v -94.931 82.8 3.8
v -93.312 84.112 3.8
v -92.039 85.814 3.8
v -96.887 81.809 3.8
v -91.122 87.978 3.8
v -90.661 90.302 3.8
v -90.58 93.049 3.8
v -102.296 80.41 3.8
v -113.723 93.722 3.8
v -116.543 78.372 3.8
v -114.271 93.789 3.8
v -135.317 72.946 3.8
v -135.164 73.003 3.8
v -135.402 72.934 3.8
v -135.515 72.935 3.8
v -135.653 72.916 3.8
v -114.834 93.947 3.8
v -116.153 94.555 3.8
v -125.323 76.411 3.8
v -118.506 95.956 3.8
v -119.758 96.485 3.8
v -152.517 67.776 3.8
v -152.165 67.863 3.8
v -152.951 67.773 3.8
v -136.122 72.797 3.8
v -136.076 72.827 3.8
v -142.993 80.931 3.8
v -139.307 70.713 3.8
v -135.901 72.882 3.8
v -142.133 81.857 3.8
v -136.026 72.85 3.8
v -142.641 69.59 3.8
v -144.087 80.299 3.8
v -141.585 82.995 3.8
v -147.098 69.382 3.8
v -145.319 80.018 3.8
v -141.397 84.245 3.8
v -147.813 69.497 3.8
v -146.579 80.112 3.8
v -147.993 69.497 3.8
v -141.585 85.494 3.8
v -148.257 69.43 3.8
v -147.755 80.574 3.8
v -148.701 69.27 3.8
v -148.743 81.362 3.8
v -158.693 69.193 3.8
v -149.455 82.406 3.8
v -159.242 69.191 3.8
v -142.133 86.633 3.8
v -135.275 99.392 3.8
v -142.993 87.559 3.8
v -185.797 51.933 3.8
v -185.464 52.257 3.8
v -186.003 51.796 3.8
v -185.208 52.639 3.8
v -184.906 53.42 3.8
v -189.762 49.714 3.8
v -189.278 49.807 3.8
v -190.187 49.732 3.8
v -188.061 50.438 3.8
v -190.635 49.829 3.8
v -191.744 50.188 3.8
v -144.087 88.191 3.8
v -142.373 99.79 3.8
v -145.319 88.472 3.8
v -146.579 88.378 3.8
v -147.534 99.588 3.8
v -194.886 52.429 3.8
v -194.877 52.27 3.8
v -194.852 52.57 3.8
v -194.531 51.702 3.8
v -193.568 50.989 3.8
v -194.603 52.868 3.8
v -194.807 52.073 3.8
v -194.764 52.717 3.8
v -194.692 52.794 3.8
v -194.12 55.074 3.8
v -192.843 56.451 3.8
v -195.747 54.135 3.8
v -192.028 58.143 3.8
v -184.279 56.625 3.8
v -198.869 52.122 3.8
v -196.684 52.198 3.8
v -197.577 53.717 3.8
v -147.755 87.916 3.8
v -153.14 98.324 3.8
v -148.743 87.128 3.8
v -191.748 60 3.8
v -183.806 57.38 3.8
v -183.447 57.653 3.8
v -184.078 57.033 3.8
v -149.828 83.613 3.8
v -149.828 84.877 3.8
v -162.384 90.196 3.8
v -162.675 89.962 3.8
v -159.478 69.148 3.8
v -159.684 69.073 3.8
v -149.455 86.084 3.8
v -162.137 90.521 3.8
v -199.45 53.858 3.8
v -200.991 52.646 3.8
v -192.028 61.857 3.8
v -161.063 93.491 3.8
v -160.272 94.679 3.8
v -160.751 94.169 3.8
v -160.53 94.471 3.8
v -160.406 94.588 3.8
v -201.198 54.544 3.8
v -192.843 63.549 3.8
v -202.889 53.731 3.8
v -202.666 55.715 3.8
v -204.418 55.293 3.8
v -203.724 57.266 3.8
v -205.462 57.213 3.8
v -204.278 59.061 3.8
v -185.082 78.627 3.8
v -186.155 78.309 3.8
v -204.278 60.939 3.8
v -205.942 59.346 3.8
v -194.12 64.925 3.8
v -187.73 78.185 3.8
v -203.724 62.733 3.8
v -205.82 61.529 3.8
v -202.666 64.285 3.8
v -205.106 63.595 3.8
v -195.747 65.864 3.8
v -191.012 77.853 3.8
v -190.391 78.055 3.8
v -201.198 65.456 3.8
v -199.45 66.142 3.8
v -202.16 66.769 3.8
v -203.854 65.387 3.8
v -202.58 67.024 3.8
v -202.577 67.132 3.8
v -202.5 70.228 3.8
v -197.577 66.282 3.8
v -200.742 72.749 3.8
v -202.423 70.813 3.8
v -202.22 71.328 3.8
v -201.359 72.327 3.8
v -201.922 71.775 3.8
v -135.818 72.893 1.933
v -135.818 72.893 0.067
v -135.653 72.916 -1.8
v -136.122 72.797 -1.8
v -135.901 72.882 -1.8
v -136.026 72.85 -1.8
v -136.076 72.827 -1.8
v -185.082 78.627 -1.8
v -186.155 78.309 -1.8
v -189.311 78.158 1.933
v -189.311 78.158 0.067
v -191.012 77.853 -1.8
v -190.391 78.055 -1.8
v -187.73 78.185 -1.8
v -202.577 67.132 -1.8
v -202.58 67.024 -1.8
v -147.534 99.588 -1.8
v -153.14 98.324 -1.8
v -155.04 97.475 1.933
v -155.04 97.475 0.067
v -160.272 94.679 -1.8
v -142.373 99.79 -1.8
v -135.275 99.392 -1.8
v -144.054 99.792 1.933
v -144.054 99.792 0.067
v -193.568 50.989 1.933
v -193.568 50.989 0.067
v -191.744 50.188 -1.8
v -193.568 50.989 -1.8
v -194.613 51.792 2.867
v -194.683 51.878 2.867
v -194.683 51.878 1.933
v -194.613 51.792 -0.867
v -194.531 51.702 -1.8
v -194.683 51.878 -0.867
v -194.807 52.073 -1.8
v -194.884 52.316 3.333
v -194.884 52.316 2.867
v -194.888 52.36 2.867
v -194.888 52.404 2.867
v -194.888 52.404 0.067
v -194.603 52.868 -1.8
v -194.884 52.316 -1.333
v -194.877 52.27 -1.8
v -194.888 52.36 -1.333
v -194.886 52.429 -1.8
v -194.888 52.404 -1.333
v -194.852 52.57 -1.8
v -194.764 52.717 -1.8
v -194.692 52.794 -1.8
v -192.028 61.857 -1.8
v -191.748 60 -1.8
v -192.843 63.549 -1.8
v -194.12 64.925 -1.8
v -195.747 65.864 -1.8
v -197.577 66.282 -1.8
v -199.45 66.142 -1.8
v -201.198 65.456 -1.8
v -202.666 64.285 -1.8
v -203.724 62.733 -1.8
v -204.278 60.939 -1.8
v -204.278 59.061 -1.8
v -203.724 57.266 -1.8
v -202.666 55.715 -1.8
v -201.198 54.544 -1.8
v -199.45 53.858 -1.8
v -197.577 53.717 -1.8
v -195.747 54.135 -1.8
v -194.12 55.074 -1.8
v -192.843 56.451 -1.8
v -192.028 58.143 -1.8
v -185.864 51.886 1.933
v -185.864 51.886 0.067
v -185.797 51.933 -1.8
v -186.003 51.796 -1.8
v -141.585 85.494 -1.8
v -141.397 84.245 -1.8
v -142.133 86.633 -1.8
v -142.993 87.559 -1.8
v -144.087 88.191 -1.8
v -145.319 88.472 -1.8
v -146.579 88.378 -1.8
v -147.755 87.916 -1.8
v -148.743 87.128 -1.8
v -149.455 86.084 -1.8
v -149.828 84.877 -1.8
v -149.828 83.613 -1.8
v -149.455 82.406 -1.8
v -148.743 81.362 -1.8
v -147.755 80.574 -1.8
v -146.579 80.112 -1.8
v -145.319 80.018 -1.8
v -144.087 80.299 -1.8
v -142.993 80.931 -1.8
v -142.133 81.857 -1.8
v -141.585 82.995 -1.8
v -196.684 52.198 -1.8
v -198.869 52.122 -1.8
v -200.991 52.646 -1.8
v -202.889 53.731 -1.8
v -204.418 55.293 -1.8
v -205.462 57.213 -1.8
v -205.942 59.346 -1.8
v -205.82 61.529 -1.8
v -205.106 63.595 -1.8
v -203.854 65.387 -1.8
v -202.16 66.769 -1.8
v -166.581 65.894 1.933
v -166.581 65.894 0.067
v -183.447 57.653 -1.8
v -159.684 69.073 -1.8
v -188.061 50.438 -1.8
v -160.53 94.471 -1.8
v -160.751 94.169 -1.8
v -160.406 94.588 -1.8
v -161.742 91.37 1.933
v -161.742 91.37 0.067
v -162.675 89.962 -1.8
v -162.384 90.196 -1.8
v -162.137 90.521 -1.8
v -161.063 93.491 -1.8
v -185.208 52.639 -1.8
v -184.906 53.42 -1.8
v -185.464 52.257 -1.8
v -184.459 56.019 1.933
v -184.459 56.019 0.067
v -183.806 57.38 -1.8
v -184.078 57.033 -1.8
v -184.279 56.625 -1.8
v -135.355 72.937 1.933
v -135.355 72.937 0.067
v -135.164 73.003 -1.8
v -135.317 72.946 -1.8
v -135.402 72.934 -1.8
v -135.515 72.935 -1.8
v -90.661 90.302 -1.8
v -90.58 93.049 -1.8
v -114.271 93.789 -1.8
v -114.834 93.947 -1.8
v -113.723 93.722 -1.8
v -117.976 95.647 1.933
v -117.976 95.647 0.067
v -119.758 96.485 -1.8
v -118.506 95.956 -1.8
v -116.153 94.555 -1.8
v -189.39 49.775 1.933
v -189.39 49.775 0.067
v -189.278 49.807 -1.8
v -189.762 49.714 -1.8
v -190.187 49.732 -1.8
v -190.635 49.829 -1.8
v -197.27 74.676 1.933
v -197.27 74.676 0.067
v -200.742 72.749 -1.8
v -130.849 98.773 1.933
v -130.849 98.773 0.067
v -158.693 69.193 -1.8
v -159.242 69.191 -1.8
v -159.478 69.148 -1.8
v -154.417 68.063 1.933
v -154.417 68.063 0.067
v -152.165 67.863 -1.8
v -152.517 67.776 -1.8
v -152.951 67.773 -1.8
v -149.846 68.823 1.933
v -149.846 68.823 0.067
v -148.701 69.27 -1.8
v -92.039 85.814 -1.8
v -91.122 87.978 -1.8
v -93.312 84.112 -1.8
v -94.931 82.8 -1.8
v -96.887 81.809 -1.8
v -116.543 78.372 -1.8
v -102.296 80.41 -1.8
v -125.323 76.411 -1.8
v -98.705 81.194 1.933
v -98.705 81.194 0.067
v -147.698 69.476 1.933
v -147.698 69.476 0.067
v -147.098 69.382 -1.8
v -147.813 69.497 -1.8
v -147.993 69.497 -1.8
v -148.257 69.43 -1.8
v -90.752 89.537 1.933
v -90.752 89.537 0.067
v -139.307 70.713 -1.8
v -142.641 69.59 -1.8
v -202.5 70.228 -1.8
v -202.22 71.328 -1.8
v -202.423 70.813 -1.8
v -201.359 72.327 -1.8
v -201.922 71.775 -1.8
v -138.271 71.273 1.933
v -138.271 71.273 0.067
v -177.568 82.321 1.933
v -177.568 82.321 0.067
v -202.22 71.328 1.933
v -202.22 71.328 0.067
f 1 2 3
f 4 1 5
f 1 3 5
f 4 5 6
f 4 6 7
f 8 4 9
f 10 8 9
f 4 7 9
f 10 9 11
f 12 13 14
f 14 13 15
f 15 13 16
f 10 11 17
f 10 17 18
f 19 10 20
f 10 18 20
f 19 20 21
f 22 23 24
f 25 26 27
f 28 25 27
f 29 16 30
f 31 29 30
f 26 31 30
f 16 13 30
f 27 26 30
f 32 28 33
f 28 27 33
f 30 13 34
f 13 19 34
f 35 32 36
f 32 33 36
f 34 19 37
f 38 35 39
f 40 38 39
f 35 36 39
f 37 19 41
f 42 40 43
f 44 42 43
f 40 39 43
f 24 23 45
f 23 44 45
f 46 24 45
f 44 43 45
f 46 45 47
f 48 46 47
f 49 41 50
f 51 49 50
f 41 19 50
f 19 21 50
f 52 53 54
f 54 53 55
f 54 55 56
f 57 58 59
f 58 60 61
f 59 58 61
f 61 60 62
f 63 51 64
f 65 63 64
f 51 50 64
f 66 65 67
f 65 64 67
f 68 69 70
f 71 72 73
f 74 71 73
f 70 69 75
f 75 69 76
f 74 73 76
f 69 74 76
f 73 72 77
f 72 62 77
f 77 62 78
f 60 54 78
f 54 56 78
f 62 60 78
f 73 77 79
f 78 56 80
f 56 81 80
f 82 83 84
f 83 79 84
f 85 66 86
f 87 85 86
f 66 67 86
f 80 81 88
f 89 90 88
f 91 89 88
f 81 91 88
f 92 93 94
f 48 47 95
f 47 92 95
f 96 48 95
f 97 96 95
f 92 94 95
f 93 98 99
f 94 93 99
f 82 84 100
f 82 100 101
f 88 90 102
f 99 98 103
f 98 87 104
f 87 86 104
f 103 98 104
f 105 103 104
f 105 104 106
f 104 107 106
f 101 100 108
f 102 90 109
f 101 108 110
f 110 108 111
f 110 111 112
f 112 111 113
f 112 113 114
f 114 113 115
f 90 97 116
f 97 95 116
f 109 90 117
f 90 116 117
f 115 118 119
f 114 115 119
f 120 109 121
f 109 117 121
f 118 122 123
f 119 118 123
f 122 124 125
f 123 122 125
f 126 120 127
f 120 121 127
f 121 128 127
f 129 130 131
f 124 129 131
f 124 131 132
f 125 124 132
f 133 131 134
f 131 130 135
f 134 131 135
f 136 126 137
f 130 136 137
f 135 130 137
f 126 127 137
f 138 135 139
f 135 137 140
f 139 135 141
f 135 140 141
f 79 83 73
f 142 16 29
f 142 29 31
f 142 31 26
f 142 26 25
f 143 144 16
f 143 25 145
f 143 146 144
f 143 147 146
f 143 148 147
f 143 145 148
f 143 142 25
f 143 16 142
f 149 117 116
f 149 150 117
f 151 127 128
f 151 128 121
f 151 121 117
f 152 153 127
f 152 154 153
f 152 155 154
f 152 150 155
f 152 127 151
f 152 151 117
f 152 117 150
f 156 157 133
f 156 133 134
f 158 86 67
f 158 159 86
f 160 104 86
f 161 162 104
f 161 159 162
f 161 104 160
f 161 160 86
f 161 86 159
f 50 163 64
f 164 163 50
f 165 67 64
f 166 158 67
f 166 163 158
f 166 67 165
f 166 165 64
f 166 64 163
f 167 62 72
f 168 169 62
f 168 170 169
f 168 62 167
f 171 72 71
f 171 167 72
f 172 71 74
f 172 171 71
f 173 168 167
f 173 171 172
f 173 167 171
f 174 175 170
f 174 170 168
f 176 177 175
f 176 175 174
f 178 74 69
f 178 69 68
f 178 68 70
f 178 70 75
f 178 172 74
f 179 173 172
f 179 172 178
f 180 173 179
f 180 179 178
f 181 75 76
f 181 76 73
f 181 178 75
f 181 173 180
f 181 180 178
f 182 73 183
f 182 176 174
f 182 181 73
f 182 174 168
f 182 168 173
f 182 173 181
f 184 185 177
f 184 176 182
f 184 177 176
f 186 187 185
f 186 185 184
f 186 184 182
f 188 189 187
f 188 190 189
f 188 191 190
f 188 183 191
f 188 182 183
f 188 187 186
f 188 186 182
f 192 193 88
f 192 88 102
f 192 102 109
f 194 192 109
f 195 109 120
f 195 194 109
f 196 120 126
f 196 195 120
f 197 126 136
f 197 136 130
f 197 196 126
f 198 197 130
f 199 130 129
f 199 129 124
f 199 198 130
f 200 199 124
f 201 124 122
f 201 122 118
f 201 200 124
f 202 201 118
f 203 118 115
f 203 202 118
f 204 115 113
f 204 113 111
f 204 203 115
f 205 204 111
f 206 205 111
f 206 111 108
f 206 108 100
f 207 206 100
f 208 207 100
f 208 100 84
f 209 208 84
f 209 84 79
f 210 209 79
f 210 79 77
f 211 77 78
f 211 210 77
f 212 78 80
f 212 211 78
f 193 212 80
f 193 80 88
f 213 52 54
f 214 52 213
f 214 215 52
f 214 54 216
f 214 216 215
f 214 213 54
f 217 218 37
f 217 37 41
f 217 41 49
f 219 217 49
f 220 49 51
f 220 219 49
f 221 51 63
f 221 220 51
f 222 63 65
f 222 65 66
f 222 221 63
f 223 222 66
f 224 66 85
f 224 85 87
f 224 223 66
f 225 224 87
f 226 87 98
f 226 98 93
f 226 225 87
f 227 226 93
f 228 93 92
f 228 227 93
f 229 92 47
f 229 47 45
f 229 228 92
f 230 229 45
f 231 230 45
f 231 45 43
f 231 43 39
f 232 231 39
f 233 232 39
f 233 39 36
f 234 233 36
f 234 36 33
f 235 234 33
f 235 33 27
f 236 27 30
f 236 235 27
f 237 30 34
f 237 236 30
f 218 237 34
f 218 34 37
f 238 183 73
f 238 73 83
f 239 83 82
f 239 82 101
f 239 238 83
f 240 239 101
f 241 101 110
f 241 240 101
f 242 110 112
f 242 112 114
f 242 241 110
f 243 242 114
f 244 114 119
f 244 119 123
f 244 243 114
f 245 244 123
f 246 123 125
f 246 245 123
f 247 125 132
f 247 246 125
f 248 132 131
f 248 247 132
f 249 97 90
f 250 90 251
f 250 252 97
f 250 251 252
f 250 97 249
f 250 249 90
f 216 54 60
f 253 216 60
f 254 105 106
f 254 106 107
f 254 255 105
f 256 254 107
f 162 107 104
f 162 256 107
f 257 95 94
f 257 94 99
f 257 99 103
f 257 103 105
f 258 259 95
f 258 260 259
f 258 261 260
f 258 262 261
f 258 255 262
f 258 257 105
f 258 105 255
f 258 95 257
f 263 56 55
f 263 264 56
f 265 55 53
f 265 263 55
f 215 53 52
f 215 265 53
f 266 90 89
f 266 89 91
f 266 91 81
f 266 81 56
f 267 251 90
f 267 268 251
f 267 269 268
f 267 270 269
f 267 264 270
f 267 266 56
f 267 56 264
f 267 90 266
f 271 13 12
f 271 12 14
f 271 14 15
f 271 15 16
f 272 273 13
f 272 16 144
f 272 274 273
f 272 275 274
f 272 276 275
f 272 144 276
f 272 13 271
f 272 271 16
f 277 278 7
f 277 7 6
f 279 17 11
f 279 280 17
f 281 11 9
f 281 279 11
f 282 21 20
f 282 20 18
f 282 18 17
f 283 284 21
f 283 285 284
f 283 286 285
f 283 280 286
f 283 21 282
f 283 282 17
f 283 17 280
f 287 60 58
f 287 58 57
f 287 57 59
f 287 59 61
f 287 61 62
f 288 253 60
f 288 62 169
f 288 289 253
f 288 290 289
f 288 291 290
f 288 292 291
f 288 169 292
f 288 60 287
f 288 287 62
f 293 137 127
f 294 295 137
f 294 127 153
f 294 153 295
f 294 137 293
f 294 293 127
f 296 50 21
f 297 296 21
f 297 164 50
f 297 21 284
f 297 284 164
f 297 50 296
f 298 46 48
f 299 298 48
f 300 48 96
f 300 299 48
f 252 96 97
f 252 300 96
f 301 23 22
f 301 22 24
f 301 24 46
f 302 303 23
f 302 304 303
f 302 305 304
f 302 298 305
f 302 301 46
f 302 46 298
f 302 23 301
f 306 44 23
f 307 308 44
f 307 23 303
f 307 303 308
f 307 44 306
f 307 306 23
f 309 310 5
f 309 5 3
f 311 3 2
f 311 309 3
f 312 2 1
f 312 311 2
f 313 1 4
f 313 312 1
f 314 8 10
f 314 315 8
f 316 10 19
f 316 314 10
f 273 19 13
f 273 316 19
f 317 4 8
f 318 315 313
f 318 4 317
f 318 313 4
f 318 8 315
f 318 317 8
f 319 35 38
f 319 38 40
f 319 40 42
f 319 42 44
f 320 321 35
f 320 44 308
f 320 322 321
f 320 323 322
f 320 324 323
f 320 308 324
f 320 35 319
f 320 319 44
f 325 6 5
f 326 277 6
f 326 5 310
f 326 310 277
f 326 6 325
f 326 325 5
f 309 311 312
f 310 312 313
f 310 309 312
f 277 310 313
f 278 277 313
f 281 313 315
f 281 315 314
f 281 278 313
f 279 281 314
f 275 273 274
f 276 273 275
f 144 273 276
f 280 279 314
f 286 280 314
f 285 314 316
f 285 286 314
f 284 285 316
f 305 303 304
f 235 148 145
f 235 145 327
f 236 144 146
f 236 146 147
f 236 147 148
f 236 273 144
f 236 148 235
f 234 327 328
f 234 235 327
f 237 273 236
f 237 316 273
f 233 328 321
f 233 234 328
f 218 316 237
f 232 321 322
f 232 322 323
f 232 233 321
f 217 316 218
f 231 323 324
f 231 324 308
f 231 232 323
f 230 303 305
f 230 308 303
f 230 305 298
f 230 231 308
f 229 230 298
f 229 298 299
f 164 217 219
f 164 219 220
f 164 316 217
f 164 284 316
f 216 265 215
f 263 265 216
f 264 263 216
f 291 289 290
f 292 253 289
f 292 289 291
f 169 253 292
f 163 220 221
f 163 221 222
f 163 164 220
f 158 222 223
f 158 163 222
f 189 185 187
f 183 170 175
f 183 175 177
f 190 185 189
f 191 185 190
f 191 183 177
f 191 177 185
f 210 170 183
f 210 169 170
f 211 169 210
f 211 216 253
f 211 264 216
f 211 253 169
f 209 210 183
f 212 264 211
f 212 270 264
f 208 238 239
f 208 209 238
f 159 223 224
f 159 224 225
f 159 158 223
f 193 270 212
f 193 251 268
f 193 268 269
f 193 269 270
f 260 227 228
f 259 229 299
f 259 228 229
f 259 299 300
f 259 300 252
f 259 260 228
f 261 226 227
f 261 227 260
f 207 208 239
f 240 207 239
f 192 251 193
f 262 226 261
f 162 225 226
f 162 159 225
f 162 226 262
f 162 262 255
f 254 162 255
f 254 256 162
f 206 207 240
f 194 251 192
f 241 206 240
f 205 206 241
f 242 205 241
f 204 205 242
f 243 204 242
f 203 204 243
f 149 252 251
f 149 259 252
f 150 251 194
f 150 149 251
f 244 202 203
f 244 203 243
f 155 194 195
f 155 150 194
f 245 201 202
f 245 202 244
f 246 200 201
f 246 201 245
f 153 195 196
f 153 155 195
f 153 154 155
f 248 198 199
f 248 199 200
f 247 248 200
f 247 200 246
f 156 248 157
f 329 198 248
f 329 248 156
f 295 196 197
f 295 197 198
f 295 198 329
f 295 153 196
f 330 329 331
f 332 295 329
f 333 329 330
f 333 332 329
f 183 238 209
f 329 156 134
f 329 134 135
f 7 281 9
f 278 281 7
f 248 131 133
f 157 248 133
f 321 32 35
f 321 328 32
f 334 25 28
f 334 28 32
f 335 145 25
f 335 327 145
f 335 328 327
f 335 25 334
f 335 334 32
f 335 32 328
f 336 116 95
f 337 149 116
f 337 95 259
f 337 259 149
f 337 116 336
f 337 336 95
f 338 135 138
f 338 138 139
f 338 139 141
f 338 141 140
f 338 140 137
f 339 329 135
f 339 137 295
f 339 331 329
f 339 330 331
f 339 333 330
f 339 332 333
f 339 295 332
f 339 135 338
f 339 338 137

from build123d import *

# Parameters (mm, degrees)
SKETCH1_R           = 1.513948887
SKETCH1_R_2         = 2.25
BOSS_EXTRUDE1_DEPTH = 2
SCALE1_SCALE        = 2.8


with BuildPart() as part:
    # Sketch1 → Boss-Extrude1 (new body)
    with BuildSketch(Plane.XY):
        with BuildLine():
            Line((-137.330840139, 84.740646997), (-129.065622639, 84.500215059))
            Line((-129.065622639, 84.500215059), (-129.094489584, 83.519353553))
            add(Edge.make_bspline(
                [(-129.094489584, 83.519353553), (-129.101127466, 83.291204798), (-129.199889222, 82.884598348), (-129.259340655, 82.689308143)],
                knots=[0.212765957, 0.212765957, 0.212765957, 0.212765957, 0.234042553, 0.234042553, 0.234042553, 0.234042553], degree=3))
            add(Edge.make_bspline(
                [(-129.259340655, 82.689308143), (-130.523557303, 78.537033893), (-136.295329969, 80.981325314), (-144.988370325, 77.341015795)],
                knots=[0.234042553, 0.234042553, 0.234042553, 0.234042553, 0.255319149, 0.255319149, 0.255319149, 0.255319149], degree=3))
            add(Edge.make_bspline(
                [(-144.988370325, 77.341015795), (-145.098029788, 77.295108948), (-145.047490899, 77.331606959), (-145.163209238, 77.309852904)],
                knots=[0.255319149, 0.255319149, 0.255319149, 0.255319149, 0.276595745, 0.276595745, 0.276595745, 0.276595745], degree=3))
            add(Edge.make_bspline(
                [(-145.163209238, 77.309852904), (-145.220654832, 77.299037913), (-145.285896319, 77.302718732), (-145.330562439, 77.26739941)],
                knots=[0.276595745, 0.276595745, 0.276595745, 0.276595745, 0.29787234, 0.29787234, 0.29787234, 0.29787234], degree=3))
            add(Edge.make_bspline(
                [(-145.330562439, 77.26739941), (-145.851667181, 76.854361866), (-147.089249586, 75.848112745), (-149.250531504, 76.047683454)],
                knots=[0.29787234, 0.29787234, 0.29787234, 0.29787234, 0.319148936, 0.319148936, 0.319148936, 0.319148936], degree=3))
            add(Edge.make_bspline(
                [(-149.250531504, 76.047683454), (-149.579241067, 76.078019194), (-149.46315051, 76.145142448), (-149.823167715, 76.007773448)],
                knots=[0.319148936, 0.319148936, 0.319148936, 0.319148936, 0.340425532, 0.340425532, 0.340425532, 0.340425532], degree=3))
            add(Edge.make_bspline(
                [(-149.823167715, 76.007773448), (-150.230952854, 75.852269176), (-150.642170668, 75.684998689), (-151.060274508, 75.505196874)],
                knots=[0.340425532, 0.340425532, 0.340425532, 0.340425532, 0.361702128, 0.361702128, 0.361702128, 0.361702128], degree=3))
            add(Edge.make_bspline(
                [(-151.060274508, 75.505196874), (-151.574575938, 75.284016862), (-153.203689978, 76.198038715), (-153.745700946, 75.937300235)],
                knots=[0.361702128, 0.361702128, 0.361702128, 0.361702128, 0.382978723, 0.382978723, 0.382978723, 0.382978723], degree=3))
            add(Edge.make_bspline(
                [(-153.745700946, 75.937300235), (-155.594836987, 75.047762033), (-159.716630745, 73.288289093), (-162.232470675, 71.858787121)],
                knots=[0.382978723, 0.382978723, 0.382978723, 0.382978723, 0.404255319, 0.404255319, 0.404255319, 0.404255319], degree=3))
            add(Edge.make_bspline(
                [(-162.232470675, 71.858787121), (-162.860836143, 71.501768336), (-162.462583912, 70.287097997), (-163.071821528, 69.816015174)],
                knots=[0.404255319, 0.404255319, 0.404255319, 0.404255319, 0.425531915, 0.425531915, 0.425531915, 0.425531915], degree=3))
            add(Edge.make_bspline(
                [(-163.071821528, 69.816015174), (-163.094733593, 69.798293477), (-163.120271861, 69.783446128), (-163.145313839, 69.766923799)],
                knots=[0.425531915, 0.425531915, 0.425531915, 0.425531915, 0.446808511, 0.446808511, 0.446808511, 0.446808511], degree=3))
            Line((-163.145313839, 69.766923799), (-163.880340349, 69.282192995))
            add(Edge.make_bspline(
                [(-163.880340349, 69.282192995), (-164.468258164, 68.894466252), (-164.620846731, 69.006028161), (-165.195757605, 69.192653966)],
                knots=[0.468085106, 0.468085106, 0.468085106, 0.468085106, 0.489361702, 0.489361702, 0.489361702, 0.489361702], degree=3))
            add(Edge.make_bspline(
                [(-165.195757605, 69.192653966), (-165.880330422, 69.414858475), (-166.586588499, 69.876830428), (-166.216843664, 70.149863853)],
                knots=[0.489361702, 0.489361702, 0.489361702, 0.489361702, 0.509556789, 0.509556789, 0.509556789, 0.509556789], degree=3))
            ThreePointArc((-166.216843664, 70.149863853), (-169.932333673, 71.346005011), (-168.915752591, 75.114583334))
            Line((-168.915752591, 75.114583334), (-169.065622639, 75.20554687))
            Line((-169.065622639, 75.20554687), (-169.064671417, 75.244319545))
            Line((-169.064671417, 75.244319545), (-169.037168666, 76.350054178))
            add(Edge.make_bspline(
                [(-169.037168666, 76.350054178), (-169.033053593, 76.794047826), (-168.700084206, 77.078711631), (-168.409216773, 77.250221263)],
                knots=[0.957446809, 0.957446809, 0.957446809, 0.957446809, 1, 1, 1, 1], degree=3))
            add(Edge.make_bspline(
                [(-168.409216773, 77.250221263), (-167.016522993, 78.071374807), (-166.193859899, 78.40091152), (-164.934151222, 79.073281388)],
                knots=[0, 0, 0, 0, 0.021276596, 0.021276596, 0.021276596, 0.021276596], degree=3))
            add(Edge.make_bspline(
                [(-164.934151222, 79.073281388), (-164.508106737, 79.300665029), (-163.405349845, 79.062094179), (-162.816253342, 79.349694368)],
                knots=[0.021276596, 0.021276596, 0.021276596, 0.021276596, 0.042553191, 0.042553191, 0.042553191, 0.042553191], degree=3))
            add(Edge.make_bspline(
                [(-162.816253342, 79.349694368), (-160.762294186, 80.3524281), (-156.1821764, 82.606350861), (-154.813800841, 83.397685633)],
                knots=[0.042553191, 0.042553191, 0.042553191, 0.042553191, 0.063829787, 0.063829787, 0.063829787, 0.063829787], degree=3))
            add(Edge.make_bspline(
                [(-154.813800841, 83.397685633), (-154.362548949, 83.658651579), (-154.360419036, 84.858143709), (-153.955446208, 85.0823635)],
                knots=[0.063829787, 0.063829787, 0.063829787, 0.063829787, 0.085106383, 0.085106383, 0.085106383, 0.085106383], degree=3))
            add(Edge.make_bspline(
                [(-153.955446208, 85.0823635), (-151.58212429, 86.396519351), (-151.052789401, 86.655893033), (-149.40636724, 86.835736205)],
                knots=[0.085106383, 0.085106383, 0.085106383, 0.085106383, 0.106382979, 0.106382979, 0.106382979, 0.106382979], degree=3))
            add(Edge.make_bspline(
                [(-149.40636724, 86.835736205), (-148.241325924, 86.963034649), (-146.873012401, 86.919588575), (-145.02819822, 86.765759283)],
                knots=[0.106382979, 0.106382979, 0.106382979, 0.106382979, 0.127659574, 0.127659574, 0.127659574, 0.127659574], degree=3))
            add(Edge.make_bspline(
                [(-145.02819822, 86.765759283), (-143.567802181, 86.644002746), (-141.759858228, 86.186588584), (-139.486373361, 85.727582157)],
                knots=[0.127659574, 0.127659574, 0.127659574, 0.127659574, 0.14893617, 0.14893617, 0.14893617, 0.14893617], degree=3))
            add(Edge.make_bspline(
                [(-139.486373361, 85.727582157), (-138.947939819, 85.618873917), (-138.058442974, 84.761801368), (-137.330840139, 84.740646997)],
                knots=[0.14893617, 0.14893617, 0.14893617, 0.14893617, 0.170212766, 0.170212766, 0.170212766, 0.170212766], degree=3))
        make_face()
        with Locations((-148.728458674, 81.356006962)):
            Circle(SKETCH1_R, mode=Mode.SUBTRACT)
        with Locations((-167.447114441, 72.697013944)):
            Circle(SKETCH1_R_2, mode=Mode.SUBTRACT)
    extrude(amount=BOSS_EXTRUDE1_DEPTH)


with BuildPart() as part_1:
    # Scale1: scaled about (-150.446524344, 79.751047586, 1)
    add(part.part.scale(SCALE1_SCALE).moved(Location((270.803743819, -143.551885655, -1.8))))


solid = part_1.part
